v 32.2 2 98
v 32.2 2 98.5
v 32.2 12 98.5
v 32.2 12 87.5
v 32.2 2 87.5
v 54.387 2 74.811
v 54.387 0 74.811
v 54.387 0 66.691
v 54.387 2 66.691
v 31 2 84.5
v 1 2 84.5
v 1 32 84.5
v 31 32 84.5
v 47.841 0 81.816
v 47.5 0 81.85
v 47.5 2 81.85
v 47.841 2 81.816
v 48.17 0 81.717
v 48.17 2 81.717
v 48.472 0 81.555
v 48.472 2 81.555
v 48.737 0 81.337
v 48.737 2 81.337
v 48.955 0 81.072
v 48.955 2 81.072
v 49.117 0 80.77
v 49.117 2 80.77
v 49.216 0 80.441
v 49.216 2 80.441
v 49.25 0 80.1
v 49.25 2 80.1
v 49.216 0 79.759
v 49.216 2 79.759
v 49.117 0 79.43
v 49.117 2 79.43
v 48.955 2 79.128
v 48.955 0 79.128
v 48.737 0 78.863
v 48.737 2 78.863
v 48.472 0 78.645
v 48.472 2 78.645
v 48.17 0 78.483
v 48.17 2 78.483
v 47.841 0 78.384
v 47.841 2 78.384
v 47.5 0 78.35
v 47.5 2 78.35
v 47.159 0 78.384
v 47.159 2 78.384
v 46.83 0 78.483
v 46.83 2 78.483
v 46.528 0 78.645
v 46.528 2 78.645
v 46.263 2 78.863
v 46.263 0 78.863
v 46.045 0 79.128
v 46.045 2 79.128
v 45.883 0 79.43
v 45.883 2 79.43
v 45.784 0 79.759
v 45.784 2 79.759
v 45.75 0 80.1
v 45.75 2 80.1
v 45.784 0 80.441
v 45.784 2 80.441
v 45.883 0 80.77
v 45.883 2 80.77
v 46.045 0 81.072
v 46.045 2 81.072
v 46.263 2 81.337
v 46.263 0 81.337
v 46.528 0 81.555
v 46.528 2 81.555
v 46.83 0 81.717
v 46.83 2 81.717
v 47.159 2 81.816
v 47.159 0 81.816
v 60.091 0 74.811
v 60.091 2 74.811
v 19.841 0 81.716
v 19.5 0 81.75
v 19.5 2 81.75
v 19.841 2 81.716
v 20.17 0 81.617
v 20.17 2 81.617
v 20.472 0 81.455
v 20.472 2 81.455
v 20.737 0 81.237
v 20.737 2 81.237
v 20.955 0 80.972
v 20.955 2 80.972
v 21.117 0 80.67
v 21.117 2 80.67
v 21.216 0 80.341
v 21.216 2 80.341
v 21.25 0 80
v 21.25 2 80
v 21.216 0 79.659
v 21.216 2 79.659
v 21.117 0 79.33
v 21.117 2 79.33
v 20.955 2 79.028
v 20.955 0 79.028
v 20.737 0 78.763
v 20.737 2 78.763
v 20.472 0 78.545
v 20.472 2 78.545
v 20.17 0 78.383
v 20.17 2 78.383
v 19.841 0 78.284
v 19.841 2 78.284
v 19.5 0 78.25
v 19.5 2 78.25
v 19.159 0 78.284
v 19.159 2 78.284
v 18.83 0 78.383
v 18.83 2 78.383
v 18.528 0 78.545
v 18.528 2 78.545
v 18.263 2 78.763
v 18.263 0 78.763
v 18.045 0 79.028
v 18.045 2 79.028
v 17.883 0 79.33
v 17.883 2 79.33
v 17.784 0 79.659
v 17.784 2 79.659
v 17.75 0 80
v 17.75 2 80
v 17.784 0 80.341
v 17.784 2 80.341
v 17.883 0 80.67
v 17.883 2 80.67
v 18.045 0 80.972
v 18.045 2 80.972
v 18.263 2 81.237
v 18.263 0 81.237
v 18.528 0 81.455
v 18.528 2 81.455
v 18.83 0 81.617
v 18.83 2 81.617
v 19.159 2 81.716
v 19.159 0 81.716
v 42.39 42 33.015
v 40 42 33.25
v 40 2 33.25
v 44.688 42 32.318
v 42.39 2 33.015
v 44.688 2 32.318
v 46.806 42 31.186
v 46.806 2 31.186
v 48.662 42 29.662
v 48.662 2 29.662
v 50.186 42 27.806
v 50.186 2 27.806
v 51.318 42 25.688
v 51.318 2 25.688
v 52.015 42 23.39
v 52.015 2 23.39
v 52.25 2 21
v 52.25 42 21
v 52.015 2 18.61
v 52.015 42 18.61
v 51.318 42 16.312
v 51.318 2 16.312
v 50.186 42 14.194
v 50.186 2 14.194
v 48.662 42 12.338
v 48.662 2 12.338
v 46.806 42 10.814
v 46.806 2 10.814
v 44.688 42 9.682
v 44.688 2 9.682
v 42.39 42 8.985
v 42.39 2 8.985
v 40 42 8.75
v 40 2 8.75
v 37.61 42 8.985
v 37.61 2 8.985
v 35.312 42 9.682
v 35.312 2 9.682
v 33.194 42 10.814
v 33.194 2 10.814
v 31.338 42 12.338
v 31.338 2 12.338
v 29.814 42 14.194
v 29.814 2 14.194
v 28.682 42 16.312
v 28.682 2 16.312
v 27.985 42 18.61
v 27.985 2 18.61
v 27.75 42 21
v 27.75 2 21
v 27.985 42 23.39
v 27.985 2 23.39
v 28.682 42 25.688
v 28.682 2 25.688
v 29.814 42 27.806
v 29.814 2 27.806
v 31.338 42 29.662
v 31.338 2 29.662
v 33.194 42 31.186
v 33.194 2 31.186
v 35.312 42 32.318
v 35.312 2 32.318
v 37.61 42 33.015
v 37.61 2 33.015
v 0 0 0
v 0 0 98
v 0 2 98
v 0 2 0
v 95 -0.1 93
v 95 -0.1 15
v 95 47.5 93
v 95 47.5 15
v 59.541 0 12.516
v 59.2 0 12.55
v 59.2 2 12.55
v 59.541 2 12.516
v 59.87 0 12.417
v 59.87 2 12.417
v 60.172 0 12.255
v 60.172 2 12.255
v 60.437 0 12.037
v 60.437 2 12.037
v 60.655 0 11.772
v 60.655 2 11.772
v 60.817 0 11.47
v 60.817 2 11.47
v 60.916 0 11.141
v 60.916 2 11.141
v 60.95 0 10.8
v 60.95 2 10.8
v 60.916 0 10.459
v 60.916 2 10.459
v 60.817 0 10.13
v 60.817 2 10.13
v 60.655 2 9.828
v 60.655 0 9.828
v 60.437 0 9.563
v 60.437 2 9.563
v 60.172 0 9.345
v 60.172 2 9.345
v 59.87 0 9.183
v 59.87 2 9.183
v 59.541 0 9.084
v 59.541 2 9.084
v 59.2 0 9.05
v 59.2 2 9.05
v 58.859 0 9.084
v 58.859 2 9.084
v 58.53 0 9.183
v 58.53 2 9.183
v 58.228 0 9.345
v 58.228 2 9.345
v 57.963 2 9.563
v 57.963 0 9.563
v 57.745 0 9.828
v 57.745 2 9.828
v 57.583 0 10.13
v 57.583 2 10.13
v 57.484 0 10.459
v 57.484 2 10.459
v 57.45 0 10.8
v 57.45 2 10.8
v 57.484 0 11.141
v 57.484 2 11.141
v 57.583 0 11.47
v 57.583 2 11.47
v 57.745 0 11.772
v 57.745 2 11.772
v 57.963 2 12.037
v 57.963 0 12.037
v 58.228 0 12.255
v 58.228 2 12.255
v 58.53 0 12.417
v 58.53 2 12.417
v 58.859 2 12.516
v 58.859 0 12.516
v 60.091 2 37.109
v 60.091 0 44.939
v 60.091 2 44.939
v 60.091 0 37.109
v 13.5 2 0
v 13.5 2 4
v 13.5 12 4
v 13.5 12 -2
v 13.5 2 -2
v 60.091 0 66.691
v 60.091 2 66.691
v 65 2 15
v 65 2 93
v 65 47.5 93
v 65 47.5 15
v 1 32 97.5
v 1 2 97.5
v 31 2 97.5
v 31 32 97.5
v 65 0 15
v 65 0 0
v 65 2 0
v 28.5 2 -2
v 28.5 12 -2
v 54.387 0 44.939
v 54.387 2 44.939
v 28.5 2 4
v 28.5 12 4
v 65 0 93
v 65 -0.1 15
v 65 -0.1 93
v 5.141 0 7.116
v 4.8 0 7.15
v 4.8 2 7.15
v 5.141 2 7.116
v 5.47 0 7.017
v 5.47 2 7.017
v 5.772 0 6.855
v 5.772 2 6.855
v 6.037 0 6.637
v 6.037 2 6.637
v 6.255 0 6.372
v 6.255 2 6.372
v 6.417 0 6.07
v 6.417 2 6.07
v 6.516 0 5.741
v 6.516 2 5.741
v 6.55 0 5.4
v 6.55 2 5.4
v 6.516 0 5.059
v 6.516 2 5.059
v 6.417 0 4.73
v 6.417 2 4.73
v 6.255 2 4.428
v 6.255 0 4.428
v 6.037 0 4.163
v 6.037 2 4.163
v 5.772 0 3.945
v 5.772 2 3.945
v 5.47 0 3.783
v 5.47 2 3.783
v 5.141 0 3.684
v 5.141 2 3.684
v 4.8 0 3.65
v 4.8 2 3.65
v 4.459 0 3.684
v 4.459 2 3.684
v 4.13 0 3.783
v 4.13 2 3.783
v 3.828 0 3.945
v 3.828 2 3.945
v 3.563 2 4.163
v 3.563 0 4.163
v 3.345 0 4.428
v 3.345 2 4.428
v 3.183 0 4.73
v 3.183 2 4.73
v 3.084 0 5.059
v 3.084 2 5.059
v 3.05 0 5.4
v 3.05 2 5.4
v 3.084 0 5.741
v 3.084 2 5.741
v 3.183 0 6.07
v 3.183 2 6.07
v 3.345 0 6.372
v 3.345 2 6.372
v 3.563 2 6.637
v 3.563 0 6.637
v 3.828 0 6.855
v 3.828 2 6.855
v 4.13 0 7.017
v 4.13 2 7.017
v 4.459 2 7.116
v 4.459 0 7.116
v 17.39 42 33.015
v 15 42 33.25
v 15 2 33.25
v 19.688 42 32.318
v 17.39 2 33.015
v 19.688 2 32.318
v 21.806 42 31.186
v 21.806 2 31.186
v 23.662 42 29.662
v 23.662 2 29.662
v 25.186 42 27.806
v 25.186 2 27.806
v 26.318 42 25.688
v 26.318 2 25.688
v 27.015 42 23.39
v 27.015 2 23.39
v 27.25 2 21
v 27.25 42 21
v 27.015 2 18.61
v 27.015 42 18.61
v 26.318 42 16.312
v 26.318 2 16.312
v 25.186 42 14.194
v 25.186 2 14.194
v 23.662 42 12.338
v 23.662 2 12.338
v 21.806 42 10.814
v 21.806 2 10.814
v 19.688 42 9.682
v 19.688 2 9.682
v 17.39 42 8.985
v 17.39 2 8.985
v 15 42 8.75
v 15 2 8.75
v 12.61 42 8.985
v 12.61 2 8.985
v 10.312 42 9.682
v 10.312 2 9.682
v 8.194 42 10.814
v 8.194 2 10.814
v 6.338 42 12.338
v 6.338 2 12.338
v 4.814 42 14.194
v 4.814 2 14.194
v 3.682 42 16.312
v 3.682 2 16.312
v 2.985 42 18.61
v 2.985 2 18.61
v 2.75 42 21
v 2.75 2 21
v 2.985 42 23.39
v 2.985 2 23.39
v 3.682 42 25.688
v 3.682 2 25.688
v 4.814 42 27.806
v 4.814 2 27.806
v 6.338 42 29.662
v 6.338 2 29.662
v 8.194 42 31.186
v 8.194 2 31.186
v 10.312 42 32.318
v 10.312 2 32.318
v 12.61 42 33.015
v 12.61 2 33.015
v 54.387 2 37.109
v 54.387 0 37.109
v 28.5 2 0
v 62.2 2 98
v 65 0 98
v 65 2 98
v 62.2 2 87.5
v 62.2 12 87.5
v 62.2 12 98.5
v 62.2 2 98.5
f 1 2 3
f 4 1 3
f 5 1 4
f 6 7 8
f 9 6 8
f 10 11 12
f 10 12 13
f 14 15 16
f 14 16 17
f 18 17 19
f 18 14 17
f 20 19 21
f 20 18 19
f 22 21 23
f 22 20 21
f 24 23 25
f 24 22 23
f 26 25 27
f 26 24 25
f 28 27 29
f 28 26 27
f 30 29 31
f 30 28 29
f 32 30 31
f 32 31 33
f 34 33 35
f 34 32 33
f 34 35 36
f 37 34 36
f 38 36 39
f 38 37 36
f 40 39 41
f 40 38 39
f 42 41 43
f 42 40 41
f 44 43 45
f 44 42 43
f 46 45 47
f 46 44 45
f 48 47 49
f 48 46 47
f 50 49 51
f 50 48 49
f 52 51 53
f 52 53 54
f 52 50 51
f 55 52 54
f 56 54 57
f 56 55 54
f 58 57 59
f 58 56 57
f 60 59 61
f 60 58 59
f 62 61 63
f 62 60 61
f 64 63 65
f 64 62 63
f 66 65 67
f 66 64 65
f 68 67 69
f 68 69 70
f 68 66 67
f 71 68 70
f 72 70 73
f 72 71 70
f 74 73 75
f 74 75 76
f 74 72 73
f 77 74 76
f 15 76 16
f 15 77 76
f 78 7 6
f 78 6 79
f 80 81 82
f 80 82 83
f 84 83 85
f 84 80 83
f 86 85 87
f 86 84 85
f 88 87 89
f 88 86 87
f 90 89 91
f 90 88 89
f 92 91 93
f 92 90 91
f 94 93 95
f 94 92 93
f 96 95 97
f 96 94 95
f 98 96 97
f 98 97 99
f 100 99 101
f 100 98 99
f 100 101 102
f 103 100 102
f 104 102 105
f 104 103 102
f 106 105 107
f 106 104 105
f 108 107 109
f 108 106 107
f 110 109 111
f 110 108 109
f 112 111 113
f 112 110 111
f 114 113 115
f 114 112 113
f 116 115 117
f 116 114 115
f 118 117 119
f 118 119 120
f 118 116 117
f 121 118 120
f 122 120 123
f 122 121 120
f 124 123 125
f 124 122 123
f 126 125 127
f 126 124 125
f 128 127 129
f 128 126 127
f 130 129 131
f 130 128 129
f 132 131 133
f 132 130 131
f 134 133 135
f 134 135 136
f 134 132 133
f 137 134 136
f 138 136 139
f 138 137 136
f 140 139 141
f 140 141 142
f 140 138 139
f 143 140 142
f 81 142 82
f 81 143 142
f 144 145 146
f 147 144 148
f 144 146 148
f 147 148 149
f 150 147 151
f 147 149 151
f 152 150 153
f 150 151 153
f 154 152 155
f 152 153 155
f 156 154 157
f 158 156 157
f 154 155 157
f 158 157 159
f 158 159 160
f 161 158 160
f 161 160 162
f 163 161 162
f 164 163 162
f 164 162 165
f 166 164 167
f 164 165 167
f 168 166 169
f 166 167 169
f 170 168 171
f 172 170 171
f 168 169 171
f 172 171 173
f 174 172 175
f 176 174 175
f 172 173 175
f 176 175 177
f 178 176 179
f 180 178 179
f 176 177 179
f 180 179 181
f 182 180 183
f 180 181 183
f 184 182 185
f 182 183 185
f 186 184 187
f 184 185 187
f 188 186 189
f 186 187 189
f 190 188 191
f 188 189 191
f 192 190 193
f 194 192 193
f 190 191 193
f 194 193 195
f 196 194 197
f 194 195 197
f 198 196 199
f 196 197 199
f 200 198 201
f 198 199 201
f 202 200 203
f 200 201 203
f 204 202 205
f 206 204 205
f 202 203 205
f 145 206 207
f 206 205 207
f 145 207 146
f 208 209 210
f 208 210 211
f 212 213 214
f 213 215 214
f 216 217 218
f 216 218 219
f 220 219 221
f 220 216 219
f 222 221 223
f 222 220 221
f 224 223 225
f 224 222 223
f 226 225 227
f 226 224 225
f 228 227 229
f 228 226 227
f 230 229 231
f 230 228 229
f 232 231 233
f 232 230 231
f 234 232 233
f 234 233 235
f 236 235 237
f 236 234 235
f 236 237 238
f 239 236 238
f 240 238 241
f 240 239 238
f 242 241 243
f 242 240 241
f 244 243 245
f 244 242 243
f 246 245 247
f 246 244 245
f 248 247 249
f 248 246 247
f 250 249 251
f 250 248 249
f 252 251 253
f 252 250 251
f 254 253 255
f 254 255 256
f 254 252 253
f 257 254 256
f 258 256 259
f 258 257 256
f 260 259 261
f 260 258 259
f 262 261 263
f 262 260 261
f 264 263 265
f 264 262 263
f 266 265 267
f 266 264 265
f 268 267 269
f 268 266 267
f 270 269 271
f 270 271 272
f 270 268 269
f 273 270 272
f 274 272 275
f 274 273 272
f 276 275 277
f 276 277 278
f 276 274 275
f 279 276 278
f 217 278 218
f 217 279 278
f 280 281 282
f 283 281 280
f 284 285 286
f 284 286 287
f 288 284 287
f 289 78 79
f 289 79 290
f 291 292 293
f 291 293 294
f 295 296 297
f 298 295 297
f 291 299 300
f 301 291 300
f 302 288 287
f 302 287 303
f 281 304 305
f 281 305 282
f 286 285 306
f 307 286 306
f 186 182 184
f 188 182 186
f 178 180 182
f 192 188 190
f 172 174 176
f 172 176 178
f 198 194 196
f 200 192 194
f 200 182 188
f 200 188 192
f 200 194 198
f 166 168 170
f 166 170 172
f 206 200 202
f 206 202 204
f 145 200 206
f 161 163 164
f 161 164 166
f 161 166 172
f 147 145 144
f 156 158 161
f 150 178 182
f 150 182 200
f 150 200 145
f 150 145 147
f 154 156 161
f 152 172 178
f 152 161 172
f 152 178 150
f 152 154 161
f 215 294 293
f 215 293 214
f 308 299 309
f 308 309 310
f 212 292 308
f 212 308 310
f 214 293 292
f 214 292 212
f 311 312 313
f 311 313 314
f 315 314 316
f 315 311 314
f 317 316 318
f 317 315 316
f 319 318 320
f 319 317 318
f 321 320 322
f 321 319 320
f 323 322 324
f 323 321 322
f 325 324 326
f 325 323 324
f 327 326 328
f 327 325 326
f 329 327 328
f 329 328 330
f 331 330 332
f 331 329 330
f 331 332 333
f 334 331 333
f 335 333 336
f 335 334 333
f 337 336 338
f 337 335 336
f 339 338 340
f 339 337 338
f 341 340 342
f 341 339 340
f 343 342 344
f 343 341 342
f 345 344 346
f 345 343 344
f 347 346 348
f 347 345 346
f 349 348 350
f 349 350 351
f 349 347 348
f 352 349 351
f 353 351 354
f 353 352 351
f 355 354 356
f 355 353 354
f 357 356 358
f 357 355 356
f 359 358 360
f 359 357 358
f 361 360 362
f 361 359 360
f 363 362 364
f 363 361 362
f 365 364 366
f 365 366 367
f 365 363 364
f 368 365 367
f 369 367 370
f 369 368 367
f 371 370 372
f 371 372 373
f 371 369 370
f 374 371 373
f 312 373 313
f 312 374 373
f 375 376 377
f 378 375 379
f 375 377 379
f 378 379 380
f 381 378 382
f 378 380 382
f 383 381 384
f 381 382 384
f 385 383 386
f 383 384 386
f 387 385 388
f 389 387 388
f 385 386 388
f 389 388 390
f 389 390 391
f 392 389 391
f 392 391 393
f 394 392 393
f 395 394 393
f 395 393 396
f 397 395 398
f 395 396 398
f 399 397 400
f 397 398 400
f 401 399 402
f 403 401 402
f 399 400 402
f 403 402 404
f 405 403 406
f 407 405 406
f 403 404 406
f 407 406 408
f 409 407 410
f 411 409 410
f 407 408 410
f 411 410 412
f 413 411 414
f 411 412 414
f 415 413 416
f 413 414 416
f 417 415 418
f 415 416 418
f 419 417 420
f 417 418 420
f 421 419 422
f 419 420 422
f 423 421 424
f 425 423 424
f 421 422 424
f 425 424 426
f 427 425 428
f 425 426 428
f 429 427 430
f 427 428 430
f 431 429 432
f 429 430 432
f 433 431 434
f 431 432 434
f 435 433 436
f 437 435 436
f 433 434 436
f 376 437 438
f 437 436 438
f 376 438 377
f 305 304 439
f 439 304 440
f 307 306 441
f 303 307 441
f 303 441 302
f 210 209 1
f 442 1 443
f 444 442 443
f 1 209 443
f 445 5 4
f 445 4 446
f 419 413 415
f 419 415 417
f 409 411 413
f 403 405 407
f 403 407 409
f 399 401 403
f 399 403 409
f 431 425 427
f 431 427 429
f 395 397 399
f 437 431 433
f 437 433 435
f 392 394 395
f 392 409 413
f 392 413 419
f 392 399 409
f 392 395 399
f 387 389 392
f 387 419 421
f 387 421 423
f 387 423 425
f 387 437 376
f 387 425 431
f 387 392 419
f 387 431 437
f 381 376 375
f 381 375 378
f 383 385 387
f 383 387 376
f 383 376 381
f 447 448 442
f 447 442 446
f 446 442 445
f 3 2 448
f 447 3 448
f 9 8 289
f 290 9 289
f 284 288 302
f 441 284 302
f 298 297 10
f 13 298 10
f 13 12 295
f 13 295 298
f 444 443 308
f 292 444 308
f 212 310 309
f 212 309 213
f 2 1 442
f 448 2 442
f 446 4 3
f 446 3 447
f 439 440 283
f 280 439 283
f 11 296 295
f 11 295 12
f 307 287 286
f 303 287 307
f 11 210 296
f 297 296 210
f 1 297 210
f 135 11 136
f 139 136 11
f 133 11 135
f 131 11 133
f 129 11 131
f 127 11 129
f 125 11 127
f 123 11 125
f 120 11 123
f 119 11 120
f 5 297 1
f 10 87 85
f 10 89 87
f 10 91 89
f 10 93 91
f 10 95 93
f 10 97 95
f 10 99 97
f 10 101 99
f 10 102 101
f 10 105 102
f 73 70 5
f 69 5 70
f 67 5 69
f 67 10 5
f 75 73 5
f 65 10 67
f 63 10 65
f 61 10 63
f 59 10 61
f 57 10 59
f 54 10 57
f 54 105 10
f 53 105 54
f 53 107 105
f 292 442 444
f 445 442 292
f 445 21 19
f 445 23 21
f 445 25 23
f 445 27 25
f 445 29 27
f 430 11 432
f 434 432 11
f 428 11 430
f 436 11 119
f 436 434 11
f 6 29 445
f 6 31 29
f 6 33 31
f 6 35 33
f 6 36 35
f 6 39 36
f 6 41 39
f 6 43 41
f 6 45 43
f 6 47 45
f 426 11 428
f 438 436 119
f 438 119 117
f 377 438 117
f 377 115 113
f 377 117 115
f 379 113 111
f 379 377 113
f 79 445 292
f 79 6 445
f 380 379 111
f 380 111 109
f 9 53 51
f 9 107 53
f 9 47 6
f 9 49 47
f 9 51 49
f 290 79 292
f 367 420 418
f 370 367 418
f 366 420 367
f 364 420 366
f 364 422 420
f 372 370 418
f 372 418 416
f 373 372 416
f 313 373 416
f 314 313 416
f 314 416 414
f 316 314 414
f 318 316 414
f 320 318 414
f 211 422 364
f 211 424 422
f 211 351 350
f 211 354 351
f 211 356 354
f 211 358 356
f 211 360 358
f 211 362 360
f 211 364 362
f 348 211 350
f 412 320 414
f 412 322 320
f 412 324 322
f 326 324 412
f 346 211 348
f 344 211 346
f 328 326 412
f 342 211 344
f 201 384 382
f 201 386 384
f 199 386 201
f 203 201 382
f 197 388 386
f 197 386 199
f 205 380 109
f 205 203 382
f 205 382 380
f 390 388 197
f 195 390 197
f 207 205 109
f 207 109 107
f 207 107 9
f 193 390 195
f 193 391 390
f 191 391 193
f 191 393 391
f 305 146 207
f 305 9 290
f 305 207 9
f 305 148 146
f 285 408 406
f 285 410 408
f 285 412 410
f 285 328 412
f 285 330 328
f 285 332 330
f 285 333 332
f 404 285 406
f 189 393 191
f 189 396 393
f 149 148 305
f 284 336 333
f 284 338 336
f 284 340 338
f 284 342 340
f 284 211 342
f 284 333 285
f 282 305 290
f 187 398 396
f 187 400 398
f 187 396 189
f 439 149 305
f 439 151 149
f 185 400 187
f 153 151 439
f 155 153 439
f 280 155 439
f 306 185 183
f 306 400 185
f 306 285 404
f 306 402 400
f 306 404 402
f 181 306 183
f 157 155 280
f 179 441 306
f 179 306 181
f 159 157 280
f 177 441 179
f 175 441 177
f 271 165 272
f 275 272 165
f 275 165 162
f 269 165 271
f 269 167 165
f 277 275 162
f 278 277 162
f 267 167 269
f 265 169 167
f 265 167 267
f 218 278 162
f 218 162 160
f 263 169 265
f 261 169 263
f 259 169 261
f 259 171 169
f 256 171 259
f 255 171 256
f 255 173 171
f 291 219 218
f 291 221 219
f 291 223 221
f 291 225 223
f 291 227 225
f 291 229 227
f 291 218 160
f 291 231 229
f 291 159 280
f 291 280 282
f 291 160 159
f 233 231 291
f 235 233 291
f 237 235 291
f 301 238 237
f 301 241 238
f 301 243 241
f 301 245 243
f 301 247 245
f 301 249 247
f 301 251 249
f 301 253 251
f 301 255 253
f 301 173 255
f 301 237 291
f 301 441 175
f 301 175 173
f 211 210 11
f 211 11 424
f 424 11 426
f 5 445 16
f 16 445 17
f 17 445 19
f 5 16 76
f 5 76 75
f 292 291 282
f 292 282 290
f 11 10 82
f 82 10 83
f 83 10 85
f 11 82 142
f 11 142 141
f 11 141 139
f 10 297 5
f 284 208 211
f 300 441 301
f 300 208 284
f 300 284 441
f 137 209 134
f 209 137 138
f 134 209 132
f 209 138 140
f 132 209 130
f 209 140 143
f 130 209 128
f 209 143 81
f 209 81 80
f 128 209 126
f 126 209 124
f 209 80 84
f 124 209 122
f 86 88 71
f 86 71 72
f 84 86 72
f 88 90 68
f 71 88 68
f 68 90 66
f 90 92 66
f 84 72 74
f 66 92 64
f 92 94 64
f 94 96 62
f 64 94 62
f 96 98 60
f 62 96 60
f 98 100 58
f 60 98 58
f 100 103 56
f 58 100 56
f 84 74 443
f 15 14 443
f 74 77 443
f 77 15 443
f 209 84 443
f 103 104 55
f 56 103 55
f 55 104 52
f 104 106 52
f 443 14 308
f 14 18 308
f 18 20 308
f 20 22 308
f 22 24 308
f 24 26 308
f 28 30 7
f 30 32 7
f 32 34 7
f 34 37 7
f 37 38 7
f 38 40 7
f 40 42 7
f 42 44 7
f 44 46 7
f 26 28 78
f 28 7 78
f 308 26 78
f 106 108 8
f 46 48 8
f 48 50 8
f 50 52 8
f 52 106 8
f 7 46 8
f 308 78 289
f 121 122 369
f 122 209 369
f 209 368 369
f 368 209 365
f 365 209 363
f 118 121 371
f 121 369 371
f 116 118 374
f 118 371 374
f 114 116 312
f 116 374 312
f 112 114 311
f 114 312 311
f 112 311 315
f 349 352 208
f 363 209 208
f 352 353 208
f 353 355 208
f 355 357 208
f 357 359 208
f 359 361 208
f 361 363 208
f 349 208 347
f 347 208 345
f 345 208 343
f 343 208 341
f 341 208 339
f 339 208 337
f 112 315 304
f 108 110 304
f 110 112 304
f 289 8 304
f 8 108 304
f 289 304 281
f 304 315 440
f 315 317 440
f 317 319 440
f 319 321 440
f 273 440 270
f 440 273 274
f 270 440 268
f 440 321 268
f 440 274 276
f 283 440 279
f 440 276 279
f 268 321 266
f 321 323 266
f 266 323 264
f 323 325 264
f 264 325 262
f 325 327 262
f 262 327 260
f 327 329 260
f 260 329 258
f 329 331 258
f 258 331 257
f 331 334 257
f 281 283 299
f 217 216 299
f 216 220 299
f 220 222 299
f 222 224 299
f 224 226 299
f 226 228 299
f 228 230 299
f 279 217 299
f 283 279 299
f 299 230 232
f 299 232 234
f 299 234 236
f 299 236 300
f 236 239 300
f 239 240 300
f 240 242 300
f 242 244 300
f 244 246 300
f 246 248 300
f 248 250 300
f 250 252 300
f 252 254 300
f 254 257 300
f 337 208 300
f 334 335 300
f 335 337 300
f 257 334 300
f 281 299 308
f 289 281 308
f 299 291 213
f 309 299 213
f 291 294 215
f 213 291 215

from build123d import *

# Parameters (mm, degrees)
SKETCH1_W           = 65
SKETCH1_H           = 98
SKETCH1_R           = 1.75
SKETCH1_W_2         = 5.703642488
SKETCH1_H_2         = 7.830424434
SKETCH1_H_3         = 8.120440153
BOSS_EXTRUDE1_DEPTH = 2
SKETCH2_W           = 15
SKETCH2_H           = 6
BOSS_EXTRUDE2_DEPTH = 10
SKETCH3_R           = 12.25
BOSS_EXTRUDE3_DEPTH = 40
SKETCH4_W           = 30
SKETCH4_H           = 13
BOSS_EXTRUDE4_DEPTH = 30
SKETCH5_W           = 30
SKETCH5_H           = 11
BOSS_EXTRUDE5_DEPTH = 10
SKETCH6_W           = 30
SKETCH6_H           = 78
BOSS_EXTRUDE6_DEPTH = 45.5
SKETCH7_W           = 30
SKETCH7_H           = 78
BOSS_EXTRUDE7_DEPTH = 2.1


with BuildPart() as part:
    # Sketch1 → Boss-Extrude1 (new body)
    with BuildSketch(Plane(origin=(0, 0, 0), x_dir=(1, 0, 0), z_dir=(0, 1, 0))):
        with Locations((32.5, -49)):
            Rectangle(SKETCH1_W, SKETCH1_H)
        with Locations(Location((4.8, -5.4, 0), (0, 0, 270))):
            Circle(SKETCH1_R, mode=Mode.SUBTRACT)
        with Locations(Location((59.2, -10.8, 0), (0, 0, 270))):
            Circle(SKETCH1_R, mode=Mode.SUBTRACT)
        with Locations(Location((19.5, -80, 0), (0, 0, 270))):
            Circle(SKETCH1_R, mode=Mode.SUBTRACT)
        with Locations(Location((47.5, -80.1, 0), (0, 0, 270))):
            Circle(SKETCH1_R, mode=Mode.SUBTRACT)
        with Locations((57.239046226, -41.024145722)):
            Rectangle(SKETCH1_W_2, SKETCH1_H_2, mode=Mode.SUBTRACT)
        with Locations((57.239046226, -70.750756999)):
            Rectangle(SKETCH1_W_2, SKETCH1_H_3, mode=Mode.SUBTRACT)
    extrude(amount=BOSS_EXTRUDE1_DEPTH)

    # Sketch2 → Boss-Extrude2 (add)
    with BuildSketch(Plane(origin=(0, 2, 0), x_dir=(1, 0, 0), z_dir=(0, 1, 0))):
        with Locations((21, -1)):
            Rectangle(SKETCH2_W, SKETCH2_H)
    extrude(amount=BOSS_EXTRUDE2_DEPTH)

    # Sketch3 → Boss-Extrude3 (add)
    with BuildSketch(Plane(origin=(0, 2, 0), x_dir=(1, 0, 0), z_dir=(0, 1, 0))):
        with Locations(Location((15, -21, 0), (0, 0, 270))):
            Circle(SKETCH3_R)
        with Locations(Location((40, -21, 0), (0, 0, 270))):
            Circle(SKETCH3_R)
    extrude(amount=BOSS_EXTRUDE3_DEPTH)

    # Sketch4 → Boss-Extrude4 (add)
    with BuildSketch(Plane(origin=(0, 2, 0), x_dir=(1, 0, 0), z_dir=(0, 1, 0))):
        with Locations((16, -91)):
            Rectangle(SKETCH4_W, SKETCH4_H)
    extrude(amount=BOSS_EXTRUDE4_DEPTH)

    # Sketch5 → Boss-Extrude5 (add)
    with BuildSketch(Plane(origin=(0, 2, 0), x_dir=(1, 0, 0), z_dir=(0, 1, 0))):
        with Locations((47.2, -93)):
            Rectangle(SKETCH5_W, SKETCH5_H)
    extrude(amount=BOSS_EXTRUDE5_DEPTH)



with BuildPart() as body_2:
    # Sketch6 → Boss-Extrude6 (new body)
    with BuildSketch(Plane(origin=(0, 2, 0), x_dir=(1, 0, 0), z_dir=(0, 1, 0))):
        with Locations((80, -54)):
            Rectangle(SKETCH6_W, SKETCH6_H)
    extrude(amount=BOSS_EXTRUDE6_DEPTH)


with BuildPart() as part_1:
    add(part.part)

    add(body_2.part)  # Boss-Extrude7 merges body 2
    # Sketch7 → Boss-Extrude7 (add)
    with BuildSketch(Plane.XZ.offset(-2)):
        with Locations((80, 54)):
            Rectangle(SKETCH7_W, SKETCH7_H)
    extrude(amount=BOSS_EXTRUDE7_DEPTH)


solid = part_1.part
